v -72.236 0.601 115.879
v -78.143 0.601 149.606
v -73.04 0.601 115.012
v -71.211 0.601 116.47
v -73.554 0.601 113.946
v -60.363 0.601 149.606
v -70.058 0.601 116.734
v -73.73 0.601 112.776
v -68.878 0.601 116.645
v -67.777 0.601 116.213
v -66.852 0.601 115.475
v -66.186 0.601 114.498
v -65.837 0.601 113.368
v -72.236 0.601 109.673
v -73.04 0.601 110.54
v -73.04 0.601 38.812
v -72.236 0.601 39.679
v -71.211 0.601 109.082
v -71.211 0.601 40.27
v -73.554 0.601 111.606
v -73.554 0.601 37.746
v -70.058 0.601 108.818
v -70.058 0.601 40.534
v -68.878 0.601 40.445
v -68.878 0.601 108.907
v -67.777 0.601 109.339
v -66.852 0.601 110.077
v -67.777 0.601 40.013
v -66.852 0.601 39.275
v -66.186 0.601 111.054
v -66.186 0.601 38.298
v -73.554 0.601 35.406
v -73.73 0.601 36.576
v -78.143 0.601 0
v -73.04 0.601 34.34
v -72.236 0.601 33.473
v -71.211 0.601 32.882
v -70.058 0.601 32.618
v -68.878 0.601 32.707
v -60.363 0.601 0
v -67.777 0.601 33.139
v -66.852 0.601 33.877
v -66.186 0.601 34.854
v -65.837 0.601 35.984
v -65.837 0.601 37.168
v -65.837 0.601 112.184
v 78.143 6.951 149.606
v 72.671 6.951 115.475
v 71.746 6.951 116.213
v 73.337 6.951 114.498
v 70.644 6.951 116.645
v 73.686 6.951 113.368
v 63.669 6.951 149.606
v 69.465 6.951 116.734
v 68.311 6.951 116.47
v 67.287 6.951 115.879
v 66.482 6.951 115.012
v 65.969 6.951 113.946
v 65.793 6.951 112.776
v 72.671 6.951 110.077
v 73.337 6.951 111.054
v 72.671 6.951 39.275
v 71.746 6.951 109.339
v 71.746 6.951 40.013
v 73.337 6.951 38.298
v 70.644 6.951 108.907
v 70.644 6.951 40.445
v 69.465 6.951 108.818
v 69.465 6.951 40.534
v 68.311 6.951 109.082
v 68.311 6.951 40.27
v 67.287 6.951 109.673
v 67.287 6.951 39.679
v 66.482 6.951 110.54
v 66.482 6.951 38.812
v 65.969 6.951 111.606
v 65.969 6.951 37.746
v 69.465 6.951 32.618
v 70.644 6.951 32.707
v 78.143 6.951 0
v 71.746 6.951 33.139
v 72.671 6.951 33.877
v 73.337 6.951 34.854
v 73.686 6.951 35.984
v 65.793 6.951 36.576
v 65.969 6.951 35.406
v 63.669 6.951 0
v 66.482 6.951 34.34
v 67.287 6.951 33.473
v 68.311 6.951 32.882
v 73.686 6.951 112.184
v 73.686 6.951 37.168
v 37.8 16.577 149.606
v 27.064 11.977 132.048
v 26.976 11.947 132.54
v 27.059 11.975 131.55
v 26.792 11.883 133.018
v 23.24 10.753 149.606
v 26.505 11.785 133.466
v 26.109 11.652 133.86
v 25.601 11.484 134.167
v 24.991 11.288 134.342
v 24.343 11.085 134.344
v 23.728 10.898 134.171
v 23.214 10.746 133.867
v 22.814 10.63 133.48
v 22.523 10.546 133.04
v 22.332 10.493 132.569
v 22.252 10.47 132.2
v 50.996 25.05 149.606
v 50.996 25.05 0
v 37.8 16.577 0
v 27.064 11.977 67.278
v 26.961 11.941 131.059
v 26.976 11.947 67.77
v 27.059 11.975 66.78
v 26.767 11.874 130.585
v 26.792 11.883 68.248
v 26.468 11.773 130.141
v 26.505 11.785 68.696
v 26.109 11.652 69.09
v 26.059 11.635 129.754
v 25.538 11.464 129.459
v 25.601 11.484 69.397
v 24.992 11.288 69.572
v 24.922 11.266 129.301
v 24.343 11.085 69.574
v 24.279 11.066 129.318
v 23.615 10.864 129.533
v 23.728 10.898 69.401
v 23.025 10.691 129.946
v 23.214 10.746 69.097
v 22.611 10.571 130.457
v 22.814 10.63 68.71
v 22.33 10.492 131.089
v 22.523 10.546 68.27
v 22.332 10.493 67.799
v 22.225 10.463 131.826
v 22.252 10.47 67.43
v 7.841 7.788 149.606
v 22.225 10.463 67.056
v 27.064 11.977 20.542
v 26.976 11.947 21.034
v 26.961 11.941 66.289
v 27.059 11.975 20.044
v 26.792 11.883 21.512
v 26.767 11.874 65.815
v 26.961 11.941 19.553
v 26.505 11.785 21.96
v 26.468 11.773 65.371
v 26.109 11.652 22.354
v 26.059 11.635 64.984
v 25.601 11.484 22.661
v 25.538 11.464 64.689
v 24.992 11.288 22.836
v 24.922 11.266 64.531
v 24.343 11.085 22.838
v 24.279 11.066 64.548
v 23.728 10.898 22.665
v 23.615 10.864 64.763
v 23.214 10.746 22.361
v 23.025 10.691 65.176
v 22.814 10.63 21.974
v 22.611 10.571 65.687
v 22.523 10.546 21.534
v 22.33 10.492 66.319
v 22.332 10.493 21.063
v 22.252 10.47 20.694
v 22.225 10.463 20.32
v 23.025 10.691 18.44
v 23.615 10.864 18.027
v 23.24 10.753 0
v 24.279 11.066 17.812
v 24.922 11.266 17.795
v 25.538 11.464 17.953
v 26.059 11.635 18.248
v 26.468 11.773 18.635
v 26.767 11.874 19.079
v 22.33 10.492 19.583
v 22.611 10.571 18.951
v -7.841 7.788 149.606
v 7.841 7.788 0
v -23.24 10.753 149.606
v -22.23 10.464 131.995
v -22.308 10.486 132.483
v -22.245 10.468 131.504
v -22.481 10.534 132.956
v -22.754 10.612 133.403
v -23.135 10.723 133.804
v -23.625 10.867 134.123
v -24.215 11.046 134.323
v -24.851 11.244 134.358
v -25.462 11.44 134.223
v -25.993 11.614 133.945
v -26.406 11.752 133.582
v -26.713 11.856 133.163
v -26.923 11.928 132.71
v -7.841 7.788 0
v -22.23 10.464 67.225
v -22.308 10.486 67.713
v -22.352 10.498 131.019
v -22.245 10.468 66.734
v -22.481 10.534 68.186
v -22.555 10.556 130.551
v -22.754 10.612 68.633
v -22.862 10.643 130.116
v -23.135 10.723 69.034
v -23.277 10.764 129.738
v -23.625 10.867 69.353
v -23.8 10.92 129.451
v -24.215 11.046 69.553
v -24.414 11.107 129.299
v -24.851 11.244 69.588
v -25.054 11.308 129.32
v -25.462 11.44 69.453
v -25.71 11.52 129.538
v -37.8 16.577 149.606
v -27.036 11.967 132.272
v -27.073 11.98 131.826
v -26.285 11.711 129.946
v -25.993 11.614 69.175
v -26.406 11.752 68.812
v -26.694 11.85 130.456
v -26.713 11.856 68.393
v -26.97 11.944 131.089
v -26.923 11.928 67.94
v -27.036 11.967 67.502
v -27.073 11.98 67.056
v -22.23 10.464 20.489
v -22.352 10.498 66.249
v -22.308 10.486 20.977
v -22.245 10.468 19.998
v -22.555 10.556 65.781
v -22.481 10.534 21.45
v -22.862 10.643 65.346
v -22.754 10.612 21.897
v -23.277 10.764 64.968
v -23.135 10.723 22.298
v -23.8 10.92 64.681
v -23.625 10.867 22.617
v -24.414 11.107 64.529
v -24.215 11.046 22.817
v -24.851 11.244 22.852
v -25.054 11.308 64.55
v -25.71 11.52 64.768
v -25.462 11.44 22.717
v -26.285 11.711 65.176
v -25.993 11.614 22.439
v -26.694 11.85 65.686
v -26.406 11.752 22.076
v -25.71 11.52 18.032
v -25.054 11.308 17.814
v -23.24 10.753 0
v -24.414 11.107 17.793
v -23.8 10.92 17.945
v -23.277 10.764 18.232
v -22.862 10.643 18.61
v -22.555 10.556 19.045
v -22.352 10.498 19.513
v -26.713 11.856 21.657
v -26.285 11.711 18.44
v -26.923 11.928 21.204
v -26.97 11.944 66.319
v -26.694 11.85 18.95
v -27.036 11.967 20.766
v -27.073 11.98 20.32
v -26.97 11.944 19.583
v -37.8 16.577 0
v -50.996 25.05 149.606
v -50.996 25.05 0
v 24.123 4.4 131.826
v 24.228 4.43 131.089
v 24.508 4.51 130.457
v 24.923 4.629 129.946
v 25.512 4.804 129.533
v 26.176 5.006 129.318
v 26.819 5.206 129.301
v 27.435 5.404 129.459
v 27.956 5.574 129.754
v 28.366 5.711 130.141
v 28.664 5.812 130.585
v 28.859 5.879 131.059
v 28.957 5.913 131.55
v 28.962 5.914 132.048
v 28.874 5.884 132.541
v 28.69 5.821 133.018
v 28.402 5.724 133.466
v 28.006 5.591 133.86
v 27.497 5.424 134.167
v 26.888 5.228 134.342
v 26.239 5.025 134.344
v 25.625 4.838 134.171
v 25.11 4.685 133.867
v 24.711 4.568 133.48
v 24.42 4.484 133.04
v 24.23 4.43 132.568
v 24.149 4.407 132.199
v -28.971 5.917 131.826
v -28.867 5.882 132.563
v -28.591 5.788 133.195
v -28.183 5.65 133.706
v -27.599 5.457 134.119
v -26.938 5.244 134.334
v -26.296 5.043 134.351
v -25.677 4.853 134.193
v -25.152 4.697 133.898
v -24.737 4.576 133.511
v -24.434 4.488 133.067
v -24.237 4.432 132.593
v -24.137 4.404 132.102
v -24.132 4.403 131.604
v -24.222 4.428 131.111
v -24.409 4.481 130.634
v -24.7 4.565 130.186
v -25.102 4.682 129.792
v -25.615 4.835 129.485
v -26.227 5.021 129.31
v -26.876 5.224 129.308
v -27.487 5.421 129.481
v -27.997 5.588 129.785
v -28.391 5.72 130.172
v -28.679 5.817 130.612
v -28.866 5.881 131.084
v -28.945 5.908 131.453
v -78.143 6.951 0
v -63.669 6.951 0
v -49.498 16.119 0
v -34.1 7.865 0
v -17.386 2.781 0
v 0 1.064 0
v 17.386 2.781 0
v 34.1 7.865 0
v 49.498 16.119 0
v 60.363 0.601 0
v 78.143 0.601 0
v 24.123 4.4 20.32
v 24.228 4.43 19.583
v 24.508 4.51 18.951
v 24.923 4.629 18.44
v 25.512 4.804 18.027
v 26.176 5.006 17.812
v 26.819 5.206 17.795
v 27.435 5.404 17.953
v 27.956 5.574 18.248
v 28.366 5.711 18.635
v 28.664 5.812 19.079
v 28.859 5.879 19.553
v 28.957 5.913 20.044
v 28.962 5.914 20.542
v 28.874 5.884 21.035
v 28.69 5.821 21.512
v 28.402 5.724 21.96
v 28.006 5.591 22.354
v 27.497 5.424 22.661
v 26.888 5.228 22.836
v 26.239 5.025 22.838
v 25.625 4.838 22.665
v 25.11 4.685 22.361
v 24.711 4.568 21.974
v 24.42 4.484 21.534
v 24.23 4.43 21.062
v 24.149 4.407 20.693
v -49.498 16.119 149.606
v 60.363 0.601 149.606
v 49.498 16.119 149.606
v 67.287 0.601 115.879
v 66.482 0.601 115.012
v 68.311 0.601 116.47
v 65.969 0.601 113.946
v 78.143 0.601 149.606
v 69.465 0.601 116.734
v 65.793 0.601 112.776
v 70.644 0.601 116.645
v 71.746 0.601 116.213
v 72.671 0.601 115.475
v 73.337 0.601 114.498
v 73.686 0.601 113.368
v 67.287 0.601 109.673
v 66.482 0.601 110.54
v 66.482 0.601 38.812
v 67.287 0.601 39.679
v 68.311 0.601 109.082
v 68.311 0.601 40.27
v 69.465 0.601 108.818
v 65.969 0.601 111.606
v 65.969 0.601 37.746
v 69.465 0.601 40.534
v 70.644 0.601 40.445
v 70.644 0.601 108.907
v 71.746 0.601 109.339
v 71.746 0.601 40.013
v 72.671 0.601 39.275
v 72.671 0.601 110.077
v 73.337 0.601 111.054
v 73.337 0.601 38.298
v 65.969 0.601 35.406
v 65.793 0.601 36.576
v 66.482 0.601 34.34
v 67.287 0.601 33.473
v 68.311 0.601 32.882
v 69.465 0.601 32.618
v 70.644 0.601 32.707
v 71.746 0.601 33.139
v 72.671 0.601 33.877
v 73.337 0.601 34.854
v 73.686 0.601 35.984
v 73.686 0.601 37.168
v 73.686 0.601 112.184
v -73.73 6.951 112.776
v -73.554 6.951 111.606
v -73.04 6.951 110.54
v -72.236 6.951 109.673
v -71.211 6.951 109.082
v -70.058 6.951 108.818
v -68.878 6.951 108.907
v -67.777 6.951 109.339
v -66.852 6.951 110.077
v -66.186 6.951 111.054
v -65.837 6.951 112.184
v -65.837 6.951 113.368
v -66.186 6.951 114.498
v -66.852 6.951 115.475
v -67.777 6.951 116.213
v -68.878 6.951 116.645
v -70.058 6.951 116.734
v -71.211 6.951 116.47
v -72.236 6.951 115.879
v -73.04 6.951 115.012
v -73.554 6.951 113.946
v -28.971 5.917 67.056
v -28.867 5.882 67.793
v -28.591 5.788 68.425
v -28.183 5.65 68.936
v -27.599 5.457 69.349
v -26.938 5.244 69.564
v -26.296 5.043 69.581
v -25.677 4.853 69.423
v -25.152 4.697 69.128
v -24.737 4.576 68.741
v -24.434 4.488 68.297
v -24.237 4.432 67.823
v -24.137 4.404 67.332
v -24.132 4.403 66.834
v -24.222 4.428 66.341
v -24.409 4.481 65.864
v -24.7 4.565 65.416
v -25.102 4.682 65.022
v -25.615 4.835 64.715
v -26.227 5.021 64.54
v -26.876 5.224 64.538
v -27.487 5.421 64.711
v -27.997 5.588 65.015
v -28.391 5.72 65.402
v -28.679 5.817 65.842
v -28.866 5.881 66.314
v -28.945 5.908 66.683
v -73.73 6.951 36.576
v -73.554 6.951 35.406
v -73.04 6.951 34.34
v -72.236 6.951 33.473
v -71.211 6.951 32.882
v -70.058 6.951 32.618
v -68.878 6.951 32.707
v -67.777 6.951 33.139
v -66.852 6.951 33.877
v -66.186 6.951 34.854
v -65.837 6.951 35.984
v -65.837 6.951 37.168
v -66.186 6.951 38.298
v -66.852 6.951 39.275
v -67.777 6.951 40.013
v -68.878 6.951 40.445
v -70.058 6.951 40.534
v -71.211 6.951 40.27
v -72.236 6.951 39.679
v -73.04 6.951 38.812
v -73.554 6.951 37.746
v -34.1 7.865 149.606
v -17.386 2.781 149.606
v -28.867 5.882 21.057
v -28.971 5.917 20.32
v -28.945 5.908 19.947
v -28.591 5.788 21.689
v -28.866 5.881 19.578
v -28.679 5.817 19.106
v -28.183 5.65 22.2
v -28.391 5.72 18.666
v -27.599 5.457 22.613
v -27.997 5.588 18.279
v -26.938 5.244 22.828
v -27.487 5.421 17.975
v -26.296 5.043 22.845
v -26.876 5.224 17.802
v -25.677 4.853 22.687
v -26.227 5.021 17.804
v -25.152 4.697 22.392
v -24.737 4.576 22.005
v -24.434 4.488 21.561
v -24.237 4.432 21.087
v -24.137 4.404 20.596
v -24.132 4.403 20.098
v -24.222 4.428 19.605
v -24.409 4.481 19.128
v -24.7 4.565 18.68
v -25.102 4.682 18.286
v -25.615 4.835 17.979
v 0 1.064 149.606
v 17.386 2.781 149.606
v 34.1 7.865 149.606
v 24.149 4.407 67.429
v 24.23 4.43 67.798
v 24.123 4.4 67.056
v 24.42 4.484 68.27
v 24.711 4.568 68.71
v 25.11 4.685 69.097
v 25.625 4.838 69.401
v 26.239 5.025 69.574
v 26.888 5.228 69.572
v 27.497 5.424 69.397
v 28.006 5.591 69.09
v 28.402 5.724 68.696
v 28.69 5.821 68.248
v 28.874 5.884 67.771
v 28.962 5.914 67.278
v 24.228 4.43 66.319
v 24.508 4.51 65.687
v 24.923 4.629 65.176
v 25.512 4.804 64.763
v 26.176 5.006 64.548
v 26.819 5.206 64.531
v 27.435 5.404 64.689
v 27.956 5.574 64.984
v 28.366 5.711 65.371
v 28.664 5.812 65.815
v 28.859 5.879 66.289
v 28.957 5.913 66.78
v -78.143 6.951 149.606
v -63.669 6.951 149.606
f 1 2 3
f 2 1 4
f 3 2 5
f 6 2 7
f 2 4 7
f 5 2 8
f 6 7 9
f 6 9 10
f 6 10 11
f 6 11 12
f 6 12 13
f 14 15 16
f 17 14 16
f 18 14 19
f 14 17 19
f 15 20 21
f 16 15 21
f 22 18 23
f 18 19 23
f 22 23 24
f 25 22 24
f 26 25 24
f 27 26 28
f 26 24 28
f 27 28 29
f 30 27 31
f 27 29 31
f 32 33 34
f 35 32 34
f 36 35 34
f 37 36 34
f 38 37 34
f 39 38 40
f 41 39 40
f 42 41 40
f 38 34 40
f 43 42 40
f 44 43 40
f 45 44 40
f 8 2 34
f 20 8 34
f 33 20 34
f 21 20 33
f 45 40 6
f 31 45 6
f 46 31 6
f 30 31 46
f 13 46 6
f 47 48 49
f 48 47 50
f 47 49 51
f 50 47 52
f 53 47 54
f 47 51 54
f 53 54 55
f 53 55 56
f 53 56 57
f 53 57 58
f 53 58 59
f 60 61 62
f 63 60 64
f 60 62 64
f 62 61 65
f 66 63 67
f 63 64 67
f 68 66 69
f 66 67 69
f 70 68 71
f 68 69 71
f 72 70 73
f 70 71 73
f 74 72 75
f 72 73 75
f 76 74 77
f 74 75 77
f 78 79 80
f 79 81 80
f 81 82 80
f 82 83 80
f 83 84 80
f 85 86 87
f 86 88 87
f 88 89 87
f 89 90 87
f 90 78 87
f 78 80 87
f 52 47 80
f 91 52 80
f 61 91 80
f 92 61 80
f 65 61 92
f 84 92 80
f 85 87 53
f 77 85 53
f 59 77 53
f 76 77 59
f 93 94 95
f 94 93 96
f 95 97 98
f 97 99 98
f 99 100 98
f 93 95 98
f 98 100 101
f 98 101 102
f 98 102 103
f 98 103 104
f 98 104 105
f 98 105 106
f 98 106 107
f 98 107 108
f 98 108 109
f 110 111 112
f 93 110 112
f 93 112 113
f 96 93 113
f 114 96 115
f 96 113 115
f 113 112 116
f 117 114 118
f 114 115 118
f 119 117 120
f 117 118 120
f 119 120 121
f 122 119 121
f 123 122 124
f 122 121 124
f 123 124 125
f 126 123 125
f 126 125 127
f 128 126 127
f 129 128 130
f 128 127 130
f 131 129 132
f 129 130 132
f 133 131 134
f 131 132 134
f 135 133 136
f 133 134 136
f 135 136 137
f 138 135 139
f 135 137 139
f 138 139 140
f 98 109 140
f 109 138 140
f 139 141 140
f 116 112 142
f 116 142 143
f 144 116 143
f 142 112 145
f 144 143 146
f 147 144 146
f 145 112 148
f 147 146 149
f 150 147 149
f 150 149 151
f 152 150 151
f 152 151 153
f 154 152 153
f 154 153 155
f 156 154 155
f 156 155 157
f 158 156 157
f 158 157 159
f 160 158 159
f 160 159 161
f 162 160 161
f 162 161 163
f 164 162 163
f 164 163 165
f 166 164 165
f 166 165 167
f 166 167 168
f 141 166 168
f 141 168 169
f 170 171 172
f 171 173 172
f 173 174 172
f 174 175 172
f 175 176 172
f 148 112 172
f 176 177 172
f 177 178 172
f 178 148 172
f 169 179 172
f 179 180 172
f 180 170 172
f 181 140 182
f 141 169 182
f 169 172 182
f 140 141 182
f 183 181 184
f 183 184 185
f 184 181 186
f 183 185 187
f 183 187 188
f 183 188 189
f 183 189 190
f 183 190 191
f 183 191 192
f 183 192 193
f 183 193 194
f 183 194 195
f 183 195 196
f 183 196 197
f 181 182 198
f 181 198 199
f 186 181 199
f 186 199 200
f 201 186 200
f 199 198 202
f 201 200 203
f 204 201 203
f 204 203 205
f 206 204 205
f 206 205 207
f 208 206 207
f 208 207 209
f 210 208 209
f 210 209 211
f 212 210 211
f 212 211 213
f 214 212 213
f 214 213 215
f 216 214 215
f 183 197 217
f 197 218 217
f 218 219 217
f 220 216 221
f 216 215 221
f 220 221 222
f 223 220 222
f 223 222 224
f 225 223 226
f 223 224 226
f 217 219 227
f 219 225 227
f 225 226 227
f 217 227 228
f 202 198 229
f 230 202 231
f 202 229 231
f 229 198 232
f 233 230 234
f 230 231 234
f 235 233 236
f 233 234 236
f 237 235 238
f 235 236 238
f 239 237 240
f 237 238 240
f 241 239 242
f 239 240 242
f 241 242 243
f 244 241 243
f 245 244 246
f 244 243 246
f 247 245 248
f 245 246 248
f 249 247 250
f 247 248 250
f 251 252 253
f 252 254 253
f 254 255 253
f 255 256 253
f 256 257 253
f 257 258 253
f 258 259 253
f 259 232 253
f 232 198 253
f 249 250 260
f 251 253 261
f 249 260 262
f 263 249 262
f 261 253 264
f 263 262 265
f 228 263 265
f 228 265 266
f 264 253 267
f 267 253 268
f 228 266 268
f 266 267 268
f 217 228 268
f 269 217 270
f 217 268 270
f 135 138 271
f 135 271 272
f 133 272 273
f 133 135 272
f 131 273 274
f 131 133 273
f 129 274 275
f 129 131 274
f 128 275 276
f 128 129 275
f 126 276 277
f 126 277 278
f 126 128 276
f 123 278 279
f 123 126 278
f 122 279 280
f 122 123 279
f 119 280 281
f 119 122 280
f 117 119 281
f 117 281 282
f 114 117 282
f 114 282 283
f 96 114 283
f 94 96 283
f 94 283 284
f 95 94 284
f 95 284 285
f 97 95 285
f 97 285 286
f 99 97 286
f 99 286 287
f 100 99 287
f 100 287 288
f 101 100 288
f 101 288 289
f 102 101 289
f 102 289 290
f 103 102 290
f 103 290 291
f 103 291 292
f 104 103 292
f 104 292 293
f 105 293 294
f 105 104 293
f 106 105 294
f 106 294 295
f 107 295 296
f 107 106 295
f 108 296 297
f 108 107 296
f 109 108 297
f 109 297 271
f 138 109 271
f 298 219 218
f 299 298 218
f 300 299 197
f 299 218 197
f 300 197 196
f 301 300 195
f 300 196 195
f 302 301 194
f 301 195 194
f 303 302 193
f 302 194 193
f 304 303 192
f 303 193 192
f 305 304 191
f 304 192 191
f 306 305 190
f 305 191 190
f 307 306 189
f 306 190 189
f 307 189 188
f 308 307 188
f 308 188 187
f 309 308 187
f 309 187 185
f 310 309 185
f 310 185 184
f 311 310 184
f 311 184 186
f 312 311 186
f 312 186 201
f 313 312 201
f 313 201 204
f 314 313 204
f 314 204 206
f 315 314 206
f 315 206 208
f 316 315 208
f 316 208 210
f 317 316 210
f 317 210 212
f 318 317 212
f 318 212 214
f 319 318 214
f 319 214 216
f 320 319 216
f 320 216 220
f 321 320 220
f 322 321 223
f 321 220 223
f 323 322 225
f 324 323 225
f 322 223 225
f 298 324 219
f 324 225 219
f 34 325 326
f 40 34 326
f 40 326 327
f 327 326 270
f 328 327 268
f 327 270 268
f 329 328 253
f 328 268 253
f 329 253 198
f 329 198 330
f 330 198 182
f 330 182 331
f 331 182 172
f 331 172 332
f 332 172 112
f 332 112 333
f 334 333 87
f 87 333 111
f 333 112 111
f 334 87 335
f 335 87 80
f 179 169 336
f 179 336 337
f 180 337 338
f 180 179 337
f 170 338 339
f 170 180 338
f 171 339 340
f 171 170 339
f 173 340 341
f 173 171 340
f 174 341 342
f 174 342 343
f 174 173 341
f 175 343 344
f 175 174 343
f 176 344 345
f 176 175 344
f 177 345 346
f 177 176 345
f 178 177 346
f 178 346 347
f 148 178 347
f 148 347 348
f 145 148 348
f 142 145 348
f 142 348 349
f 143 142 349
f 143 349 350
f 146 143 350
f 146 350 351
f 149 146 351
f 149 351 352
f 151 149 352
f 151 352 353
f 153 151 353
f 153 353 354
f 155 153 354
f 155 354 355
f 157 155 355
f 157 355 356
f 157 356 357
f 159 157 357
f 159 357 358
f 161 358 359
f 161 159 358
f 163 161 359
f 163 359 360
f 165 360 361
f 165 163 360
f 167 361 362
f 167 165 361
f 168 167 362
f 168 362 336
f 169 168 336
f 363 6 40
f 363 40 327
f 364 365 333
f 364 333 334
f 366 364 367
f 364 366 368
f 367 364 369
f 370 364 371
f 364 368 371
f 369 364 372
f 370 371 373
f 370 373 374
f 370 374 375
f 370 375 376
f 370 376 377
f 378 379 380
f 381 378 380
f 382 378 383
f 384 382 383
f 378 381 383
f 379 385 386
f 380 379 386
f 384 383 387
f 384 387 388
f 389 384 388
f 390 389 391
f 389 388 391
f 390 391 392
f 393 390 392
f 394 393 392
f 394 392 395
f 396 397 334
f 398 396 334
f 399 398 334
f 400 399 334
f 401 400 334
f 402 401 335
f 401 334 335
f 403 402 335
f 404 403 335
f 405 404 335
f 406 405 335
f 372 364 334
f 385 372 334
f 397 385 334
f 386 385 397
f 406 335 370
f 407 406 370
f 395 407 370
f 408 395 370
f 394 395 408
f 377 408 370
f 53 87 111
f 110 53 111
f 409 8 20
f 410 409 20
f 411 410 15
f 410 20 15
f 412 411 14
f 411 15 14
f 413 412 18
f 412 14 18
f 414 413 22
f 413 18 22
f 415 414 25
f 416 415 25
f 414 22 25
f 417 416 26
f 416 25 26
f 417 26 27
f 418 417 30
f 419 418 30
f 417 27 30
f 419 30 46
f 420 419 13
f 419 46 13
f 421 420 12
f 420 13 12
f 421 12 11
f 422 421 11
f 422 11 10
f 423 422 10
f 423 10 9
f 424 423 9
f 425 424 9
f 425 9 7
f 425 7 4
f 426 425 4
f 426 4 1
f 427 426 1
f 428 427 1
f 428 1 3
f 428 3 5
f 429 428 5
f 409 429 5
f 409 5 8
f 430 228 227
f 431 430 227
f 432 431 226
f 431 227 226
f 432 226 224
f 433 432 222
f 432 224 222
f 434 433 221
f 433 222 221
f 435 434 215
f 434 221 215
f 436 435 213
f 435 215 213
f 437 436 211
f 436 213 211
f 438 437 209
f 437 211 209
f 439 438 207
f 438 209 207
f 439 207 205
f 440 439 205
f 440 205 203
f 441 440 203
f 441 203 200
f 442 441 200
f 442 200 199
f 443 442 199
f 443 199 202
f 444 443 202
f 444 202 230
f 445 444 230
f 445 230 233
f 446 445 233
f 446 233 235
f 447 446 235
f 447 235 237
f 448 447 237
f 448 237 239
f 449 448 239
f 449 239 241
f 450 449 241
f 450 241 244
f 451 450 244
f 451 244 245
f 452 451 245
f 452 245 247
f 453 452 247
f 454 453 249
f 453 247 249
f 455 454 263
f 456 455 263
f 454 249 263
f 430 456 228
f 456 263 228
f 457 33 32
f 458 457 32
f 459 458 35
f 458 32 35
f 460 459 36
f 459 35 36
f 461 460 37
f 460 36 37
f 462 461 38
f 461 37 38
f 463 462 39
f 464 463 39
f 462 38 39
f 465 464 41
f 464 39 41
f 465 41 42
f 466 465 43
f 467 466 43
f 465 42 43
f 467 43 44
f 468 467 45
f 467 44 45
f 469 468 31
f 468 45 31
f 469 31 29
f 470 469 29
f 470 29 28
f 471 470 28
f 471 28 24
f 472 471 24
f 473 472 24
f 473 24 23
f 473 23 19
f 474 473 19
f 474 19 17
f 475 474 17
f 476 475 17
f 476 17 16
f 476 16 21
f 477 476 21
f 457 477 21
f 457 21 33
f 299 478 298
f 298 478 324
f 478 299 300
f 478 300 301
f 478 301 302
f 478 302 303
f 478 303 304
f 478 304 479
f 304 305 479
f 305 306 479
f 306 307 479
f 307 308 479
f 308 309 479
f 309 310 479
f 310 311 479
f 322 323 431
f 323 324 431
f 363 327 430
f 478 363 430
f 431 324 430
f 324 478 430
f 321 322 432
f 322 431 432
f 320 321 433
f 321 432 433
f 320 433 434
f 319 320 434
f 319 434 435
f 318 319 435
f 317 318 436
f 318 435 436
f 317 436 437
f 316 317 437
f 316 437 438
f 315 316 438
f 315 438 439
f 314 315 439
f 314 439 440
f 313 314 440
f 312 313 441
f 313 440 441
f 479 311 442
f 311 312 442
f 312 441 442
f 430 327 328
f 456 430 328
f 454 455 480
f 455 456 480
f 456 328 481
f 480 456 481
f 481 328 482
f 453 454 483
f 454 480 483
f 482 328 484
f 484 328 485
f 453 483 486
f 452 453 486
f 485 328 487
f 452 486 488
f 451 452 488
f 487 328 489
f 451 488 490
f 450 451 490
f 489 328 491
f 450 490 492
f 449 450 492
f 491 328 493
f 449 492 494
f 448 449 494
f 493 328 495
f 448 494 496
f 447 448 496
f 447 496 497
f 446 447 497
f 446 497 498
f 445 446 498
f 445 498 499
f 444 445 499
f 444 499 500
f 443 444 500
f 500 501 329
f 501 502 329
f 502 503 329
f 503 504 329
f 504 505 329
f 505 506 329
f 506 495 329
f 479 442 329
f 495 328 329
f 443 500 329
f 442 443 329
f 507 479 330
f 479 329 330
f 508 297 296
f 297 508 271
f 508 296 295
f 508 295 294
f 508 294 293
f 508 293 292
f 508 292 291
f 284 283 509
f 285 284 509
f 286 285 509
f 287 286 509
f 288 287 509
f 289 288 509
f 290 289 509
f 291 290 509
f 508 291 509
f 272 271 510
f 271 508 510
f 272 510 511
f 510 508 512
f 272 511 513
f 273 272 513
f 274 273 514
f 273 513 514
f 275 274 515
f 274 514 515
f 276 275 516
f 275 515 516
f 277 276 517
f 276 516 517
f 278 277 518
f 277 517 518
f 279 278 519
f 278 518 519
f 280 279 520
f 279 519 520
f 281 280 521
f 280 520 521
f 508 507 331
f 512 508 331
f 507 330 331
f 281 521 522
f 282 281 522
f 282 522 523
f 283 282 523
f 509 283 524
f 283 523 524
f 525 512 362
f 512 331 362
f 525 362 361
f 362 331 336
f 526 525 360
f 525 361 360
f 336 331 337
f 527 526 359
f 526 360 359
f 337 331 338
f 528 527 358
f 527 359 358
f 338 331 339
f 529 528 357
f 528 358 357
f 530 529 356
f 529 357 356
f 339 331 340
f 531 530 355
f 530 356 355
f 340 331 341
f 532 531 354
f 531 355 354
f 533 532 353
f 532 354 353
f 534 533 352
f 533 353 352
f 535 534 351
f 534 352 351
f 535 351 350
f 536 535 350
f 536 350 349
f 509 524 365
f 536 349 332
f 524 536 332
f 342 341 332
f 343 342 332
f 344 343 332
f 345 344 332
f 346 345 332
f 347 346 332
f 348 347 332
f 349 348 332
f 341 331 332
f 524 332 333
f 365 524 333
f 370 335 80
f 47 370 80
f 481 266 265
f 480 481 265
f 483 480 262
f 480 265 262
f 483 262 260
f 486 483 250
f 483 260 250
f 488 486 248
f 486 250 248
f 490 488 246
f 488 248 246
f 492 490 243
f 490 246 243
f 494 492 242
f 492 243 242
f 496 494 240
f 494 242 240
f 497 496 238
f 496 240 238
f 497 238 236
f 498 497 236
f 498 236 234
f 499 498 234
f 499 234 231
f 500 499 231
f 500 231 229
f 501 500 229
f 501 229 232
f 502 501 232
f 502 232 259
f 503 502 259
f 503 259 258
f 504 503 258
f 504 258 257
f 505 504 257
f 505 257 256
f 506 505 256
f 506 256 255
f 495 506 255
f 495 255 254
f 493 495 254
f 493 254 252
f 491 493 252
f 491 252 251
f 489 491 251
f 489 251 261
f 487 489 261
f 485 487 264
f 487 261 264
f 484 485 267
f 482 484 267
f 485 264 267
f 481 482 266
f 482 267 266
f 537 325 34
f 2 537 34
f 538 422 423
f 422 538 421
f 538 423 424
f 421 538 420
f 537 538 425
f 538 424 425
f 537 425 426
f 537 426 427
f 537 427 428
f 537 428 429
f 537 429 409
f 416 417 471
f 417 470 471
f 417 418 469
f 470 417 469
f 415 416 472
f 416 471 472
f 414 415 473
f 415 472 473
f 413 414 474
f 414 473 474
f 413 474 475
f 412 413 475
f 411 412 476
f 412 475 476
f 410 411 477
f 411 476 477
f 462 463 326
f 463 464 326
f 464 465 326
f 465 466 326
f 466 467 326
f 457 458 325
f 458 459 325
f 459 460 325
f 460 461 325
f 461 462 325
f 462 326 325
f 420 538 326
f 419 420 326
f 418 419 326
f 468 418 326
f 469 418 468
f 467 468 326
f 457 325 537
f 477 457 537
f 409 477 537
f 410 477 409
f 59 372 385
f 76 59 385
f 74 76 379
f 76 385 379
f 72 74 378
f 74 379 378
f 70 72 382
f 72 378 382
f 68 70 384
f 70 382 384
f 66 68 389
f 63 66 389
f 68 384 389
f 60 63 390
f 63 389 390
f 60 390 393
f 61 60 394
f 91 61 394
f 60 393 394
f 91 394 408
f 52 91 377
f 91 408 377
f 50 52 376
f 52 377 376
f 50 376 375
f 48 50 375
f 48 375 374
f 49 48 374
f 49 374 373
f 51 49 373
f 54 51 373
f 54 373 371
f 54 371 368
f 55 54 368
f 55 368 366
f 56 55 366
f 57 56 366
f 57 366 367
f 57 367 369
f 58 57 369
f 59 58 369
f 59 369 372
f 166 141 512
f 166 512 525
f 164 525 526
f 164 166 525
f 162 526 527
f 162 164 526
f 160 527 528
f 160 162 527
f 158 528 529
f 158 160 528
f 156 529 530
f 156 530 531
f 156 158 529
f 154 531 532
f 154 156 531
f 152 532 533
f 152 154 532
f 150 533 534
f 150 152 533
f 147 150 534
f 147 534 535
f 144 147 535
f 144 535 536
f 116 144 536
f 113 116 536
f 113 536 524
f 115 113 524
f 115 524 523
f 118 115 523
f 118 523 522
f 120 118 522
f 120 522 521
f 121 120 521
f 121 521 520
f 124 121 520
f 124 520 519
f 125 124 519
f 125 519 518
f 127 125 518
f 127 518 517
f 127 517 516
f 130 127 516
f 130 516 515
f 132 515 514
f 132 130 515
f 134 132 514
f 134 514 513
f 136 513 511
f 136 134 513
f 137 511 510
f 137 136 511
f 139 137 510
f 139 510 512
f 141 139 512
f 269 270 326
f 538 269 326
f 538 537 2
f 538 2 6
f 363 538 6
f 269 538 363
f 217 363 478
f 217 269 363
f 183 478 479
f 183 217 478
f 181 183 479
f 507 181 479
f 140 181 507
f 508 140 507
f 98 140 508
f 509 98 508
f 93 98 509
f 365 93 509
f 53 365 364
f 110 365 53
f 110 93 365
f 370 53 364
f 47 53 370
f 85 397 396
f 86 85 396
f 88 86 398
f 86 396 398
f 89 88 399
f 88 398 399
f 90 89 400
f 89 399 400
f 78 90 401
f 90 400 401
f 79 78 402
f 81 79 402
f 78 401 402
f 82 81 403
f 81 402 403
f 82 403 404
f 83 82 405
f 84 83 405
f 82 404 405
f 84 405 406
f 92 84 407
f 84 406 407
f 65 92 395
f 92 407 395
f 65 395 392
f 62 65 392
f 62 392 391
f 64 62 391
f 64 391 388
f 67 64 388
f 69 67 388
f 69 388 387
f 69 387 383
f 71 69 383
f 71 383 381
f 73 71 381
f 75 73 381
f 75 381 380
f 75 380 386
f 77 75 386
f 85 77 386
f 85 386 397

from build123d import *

# Parameters (mm, degrees)
BOSS_EXTRUDE1_DEPTH         = 149.606
SKETCH5_R                   = 2.54
CUT_EXTRUDE1_DEPTH          = 25.4
SKETCH4_R                   = 2.54
CUT_EXTRUDE2_DEPTH          = 25.4
TAP_DRILL_FOR_3_8_16_TAP1_D = 7.9375


with BuildPart() as part:
    # Sketch1 → Boss-Extrude1 (new body)
    with BuildSketch(Plane.XY):
        with BuildLine():
            Line((-63.668954771, 6.951268616), (-78.143354, 6.951268616))
            Line((-78.143354, 6.951268616), (-78.143354, 0.601268616))
            Line((-78.143354, 0.601268616), (-60.363354, 0.601268616))
            Line((-60.363354, 0.601268616), (-49.49782024, 16.118858997))
            ThreePointArc((-49.49782024, 16.118858997), (0, 1.06448034), (49.49782024, 16.118858997))
            Line((49.49782024, 16.118858997), (60.363354, 0.601268616))
            Line((60.363354, 0.601268616), (78.143354, 0.601268616))
            Line((78.143354, 0.601268616), (78.143354, 6.951268616))
            Line((78.143354, 6.951268616), (63.668954771, 6.951268616))
            Line((63.668954771, 6.951268616), (50.996127998, 25.049940912))
            ThreePointArc((50.996127998, 25.049940912), (0, 7.41448034), (-50.996127998, 25.049940912))
            Line((-50.996127998, 25.049940912), (-63.668954771, 6.951268616))
        make_face()
    extrude(amount=BOSS_EXTRUDE1_DEPTH)

    # Sketch5 → Cut-Extrude1 (cut)
    with BuildSketch(Plane(origin=(0.999392331, 3.192633299, 0), x_dir=(0.9543356688296087, -0.29873639081896847, 0), z_dir=(0.29873639081896847, 0.9543356688296087, 0))):
        with Locations((-26.875664159, -20.32)):
            Circle(SKETCH5_R)
        with Locations((-26.875664159, -67.056)):
            Circle(SKETCH5_R)
        with Locations((-26.875664159, -131.826)):
            Circle(SKETCH5_R)
    extrude(amount=-CUT_EXTRUDE1_DEPTH, mode=Mode.SUBTRACT)

    # Sketch4 → Cut-Extrude2 (cut)
    with BuildSketch(Plane(origin=(-0.999392331, 3.192633299, 0), x_dir=(-0.9543356688296079, -0.2987363908189716, 0), z_dir=(0.2987363908189716, -0.9543356688296079, 0))):
        with Locations((-26.875664159, -131.826)):
            Circle(SKETCH4_R)
        with Locations((-26.875664159, -67.056)):
            Circle(SKETCH4_R)
        with Locations((-26.875664159, -20.32)):
            Circle(SKETCH4_R)
    extrude(amount=CUT_EXTRUDE2_DEPTH, mode=Mode.SUBTRACT)

    # Tap Drill for 3/8-16 Tap1 (through all)
    with Locations(Plane(origin=(0, 6.951268616, 0), x_dir=(1, 0, 0), z_dir=(0, 1, 0))):
        with Locations((-69.761354, -112.776), (-69.761354, -36.576), (69.761354, -112.776), (69.761354, -36.576)):
            Hole(TAP_DRILL_FOR_3_8_16_TAP1_D / 2)


solid = part.part
